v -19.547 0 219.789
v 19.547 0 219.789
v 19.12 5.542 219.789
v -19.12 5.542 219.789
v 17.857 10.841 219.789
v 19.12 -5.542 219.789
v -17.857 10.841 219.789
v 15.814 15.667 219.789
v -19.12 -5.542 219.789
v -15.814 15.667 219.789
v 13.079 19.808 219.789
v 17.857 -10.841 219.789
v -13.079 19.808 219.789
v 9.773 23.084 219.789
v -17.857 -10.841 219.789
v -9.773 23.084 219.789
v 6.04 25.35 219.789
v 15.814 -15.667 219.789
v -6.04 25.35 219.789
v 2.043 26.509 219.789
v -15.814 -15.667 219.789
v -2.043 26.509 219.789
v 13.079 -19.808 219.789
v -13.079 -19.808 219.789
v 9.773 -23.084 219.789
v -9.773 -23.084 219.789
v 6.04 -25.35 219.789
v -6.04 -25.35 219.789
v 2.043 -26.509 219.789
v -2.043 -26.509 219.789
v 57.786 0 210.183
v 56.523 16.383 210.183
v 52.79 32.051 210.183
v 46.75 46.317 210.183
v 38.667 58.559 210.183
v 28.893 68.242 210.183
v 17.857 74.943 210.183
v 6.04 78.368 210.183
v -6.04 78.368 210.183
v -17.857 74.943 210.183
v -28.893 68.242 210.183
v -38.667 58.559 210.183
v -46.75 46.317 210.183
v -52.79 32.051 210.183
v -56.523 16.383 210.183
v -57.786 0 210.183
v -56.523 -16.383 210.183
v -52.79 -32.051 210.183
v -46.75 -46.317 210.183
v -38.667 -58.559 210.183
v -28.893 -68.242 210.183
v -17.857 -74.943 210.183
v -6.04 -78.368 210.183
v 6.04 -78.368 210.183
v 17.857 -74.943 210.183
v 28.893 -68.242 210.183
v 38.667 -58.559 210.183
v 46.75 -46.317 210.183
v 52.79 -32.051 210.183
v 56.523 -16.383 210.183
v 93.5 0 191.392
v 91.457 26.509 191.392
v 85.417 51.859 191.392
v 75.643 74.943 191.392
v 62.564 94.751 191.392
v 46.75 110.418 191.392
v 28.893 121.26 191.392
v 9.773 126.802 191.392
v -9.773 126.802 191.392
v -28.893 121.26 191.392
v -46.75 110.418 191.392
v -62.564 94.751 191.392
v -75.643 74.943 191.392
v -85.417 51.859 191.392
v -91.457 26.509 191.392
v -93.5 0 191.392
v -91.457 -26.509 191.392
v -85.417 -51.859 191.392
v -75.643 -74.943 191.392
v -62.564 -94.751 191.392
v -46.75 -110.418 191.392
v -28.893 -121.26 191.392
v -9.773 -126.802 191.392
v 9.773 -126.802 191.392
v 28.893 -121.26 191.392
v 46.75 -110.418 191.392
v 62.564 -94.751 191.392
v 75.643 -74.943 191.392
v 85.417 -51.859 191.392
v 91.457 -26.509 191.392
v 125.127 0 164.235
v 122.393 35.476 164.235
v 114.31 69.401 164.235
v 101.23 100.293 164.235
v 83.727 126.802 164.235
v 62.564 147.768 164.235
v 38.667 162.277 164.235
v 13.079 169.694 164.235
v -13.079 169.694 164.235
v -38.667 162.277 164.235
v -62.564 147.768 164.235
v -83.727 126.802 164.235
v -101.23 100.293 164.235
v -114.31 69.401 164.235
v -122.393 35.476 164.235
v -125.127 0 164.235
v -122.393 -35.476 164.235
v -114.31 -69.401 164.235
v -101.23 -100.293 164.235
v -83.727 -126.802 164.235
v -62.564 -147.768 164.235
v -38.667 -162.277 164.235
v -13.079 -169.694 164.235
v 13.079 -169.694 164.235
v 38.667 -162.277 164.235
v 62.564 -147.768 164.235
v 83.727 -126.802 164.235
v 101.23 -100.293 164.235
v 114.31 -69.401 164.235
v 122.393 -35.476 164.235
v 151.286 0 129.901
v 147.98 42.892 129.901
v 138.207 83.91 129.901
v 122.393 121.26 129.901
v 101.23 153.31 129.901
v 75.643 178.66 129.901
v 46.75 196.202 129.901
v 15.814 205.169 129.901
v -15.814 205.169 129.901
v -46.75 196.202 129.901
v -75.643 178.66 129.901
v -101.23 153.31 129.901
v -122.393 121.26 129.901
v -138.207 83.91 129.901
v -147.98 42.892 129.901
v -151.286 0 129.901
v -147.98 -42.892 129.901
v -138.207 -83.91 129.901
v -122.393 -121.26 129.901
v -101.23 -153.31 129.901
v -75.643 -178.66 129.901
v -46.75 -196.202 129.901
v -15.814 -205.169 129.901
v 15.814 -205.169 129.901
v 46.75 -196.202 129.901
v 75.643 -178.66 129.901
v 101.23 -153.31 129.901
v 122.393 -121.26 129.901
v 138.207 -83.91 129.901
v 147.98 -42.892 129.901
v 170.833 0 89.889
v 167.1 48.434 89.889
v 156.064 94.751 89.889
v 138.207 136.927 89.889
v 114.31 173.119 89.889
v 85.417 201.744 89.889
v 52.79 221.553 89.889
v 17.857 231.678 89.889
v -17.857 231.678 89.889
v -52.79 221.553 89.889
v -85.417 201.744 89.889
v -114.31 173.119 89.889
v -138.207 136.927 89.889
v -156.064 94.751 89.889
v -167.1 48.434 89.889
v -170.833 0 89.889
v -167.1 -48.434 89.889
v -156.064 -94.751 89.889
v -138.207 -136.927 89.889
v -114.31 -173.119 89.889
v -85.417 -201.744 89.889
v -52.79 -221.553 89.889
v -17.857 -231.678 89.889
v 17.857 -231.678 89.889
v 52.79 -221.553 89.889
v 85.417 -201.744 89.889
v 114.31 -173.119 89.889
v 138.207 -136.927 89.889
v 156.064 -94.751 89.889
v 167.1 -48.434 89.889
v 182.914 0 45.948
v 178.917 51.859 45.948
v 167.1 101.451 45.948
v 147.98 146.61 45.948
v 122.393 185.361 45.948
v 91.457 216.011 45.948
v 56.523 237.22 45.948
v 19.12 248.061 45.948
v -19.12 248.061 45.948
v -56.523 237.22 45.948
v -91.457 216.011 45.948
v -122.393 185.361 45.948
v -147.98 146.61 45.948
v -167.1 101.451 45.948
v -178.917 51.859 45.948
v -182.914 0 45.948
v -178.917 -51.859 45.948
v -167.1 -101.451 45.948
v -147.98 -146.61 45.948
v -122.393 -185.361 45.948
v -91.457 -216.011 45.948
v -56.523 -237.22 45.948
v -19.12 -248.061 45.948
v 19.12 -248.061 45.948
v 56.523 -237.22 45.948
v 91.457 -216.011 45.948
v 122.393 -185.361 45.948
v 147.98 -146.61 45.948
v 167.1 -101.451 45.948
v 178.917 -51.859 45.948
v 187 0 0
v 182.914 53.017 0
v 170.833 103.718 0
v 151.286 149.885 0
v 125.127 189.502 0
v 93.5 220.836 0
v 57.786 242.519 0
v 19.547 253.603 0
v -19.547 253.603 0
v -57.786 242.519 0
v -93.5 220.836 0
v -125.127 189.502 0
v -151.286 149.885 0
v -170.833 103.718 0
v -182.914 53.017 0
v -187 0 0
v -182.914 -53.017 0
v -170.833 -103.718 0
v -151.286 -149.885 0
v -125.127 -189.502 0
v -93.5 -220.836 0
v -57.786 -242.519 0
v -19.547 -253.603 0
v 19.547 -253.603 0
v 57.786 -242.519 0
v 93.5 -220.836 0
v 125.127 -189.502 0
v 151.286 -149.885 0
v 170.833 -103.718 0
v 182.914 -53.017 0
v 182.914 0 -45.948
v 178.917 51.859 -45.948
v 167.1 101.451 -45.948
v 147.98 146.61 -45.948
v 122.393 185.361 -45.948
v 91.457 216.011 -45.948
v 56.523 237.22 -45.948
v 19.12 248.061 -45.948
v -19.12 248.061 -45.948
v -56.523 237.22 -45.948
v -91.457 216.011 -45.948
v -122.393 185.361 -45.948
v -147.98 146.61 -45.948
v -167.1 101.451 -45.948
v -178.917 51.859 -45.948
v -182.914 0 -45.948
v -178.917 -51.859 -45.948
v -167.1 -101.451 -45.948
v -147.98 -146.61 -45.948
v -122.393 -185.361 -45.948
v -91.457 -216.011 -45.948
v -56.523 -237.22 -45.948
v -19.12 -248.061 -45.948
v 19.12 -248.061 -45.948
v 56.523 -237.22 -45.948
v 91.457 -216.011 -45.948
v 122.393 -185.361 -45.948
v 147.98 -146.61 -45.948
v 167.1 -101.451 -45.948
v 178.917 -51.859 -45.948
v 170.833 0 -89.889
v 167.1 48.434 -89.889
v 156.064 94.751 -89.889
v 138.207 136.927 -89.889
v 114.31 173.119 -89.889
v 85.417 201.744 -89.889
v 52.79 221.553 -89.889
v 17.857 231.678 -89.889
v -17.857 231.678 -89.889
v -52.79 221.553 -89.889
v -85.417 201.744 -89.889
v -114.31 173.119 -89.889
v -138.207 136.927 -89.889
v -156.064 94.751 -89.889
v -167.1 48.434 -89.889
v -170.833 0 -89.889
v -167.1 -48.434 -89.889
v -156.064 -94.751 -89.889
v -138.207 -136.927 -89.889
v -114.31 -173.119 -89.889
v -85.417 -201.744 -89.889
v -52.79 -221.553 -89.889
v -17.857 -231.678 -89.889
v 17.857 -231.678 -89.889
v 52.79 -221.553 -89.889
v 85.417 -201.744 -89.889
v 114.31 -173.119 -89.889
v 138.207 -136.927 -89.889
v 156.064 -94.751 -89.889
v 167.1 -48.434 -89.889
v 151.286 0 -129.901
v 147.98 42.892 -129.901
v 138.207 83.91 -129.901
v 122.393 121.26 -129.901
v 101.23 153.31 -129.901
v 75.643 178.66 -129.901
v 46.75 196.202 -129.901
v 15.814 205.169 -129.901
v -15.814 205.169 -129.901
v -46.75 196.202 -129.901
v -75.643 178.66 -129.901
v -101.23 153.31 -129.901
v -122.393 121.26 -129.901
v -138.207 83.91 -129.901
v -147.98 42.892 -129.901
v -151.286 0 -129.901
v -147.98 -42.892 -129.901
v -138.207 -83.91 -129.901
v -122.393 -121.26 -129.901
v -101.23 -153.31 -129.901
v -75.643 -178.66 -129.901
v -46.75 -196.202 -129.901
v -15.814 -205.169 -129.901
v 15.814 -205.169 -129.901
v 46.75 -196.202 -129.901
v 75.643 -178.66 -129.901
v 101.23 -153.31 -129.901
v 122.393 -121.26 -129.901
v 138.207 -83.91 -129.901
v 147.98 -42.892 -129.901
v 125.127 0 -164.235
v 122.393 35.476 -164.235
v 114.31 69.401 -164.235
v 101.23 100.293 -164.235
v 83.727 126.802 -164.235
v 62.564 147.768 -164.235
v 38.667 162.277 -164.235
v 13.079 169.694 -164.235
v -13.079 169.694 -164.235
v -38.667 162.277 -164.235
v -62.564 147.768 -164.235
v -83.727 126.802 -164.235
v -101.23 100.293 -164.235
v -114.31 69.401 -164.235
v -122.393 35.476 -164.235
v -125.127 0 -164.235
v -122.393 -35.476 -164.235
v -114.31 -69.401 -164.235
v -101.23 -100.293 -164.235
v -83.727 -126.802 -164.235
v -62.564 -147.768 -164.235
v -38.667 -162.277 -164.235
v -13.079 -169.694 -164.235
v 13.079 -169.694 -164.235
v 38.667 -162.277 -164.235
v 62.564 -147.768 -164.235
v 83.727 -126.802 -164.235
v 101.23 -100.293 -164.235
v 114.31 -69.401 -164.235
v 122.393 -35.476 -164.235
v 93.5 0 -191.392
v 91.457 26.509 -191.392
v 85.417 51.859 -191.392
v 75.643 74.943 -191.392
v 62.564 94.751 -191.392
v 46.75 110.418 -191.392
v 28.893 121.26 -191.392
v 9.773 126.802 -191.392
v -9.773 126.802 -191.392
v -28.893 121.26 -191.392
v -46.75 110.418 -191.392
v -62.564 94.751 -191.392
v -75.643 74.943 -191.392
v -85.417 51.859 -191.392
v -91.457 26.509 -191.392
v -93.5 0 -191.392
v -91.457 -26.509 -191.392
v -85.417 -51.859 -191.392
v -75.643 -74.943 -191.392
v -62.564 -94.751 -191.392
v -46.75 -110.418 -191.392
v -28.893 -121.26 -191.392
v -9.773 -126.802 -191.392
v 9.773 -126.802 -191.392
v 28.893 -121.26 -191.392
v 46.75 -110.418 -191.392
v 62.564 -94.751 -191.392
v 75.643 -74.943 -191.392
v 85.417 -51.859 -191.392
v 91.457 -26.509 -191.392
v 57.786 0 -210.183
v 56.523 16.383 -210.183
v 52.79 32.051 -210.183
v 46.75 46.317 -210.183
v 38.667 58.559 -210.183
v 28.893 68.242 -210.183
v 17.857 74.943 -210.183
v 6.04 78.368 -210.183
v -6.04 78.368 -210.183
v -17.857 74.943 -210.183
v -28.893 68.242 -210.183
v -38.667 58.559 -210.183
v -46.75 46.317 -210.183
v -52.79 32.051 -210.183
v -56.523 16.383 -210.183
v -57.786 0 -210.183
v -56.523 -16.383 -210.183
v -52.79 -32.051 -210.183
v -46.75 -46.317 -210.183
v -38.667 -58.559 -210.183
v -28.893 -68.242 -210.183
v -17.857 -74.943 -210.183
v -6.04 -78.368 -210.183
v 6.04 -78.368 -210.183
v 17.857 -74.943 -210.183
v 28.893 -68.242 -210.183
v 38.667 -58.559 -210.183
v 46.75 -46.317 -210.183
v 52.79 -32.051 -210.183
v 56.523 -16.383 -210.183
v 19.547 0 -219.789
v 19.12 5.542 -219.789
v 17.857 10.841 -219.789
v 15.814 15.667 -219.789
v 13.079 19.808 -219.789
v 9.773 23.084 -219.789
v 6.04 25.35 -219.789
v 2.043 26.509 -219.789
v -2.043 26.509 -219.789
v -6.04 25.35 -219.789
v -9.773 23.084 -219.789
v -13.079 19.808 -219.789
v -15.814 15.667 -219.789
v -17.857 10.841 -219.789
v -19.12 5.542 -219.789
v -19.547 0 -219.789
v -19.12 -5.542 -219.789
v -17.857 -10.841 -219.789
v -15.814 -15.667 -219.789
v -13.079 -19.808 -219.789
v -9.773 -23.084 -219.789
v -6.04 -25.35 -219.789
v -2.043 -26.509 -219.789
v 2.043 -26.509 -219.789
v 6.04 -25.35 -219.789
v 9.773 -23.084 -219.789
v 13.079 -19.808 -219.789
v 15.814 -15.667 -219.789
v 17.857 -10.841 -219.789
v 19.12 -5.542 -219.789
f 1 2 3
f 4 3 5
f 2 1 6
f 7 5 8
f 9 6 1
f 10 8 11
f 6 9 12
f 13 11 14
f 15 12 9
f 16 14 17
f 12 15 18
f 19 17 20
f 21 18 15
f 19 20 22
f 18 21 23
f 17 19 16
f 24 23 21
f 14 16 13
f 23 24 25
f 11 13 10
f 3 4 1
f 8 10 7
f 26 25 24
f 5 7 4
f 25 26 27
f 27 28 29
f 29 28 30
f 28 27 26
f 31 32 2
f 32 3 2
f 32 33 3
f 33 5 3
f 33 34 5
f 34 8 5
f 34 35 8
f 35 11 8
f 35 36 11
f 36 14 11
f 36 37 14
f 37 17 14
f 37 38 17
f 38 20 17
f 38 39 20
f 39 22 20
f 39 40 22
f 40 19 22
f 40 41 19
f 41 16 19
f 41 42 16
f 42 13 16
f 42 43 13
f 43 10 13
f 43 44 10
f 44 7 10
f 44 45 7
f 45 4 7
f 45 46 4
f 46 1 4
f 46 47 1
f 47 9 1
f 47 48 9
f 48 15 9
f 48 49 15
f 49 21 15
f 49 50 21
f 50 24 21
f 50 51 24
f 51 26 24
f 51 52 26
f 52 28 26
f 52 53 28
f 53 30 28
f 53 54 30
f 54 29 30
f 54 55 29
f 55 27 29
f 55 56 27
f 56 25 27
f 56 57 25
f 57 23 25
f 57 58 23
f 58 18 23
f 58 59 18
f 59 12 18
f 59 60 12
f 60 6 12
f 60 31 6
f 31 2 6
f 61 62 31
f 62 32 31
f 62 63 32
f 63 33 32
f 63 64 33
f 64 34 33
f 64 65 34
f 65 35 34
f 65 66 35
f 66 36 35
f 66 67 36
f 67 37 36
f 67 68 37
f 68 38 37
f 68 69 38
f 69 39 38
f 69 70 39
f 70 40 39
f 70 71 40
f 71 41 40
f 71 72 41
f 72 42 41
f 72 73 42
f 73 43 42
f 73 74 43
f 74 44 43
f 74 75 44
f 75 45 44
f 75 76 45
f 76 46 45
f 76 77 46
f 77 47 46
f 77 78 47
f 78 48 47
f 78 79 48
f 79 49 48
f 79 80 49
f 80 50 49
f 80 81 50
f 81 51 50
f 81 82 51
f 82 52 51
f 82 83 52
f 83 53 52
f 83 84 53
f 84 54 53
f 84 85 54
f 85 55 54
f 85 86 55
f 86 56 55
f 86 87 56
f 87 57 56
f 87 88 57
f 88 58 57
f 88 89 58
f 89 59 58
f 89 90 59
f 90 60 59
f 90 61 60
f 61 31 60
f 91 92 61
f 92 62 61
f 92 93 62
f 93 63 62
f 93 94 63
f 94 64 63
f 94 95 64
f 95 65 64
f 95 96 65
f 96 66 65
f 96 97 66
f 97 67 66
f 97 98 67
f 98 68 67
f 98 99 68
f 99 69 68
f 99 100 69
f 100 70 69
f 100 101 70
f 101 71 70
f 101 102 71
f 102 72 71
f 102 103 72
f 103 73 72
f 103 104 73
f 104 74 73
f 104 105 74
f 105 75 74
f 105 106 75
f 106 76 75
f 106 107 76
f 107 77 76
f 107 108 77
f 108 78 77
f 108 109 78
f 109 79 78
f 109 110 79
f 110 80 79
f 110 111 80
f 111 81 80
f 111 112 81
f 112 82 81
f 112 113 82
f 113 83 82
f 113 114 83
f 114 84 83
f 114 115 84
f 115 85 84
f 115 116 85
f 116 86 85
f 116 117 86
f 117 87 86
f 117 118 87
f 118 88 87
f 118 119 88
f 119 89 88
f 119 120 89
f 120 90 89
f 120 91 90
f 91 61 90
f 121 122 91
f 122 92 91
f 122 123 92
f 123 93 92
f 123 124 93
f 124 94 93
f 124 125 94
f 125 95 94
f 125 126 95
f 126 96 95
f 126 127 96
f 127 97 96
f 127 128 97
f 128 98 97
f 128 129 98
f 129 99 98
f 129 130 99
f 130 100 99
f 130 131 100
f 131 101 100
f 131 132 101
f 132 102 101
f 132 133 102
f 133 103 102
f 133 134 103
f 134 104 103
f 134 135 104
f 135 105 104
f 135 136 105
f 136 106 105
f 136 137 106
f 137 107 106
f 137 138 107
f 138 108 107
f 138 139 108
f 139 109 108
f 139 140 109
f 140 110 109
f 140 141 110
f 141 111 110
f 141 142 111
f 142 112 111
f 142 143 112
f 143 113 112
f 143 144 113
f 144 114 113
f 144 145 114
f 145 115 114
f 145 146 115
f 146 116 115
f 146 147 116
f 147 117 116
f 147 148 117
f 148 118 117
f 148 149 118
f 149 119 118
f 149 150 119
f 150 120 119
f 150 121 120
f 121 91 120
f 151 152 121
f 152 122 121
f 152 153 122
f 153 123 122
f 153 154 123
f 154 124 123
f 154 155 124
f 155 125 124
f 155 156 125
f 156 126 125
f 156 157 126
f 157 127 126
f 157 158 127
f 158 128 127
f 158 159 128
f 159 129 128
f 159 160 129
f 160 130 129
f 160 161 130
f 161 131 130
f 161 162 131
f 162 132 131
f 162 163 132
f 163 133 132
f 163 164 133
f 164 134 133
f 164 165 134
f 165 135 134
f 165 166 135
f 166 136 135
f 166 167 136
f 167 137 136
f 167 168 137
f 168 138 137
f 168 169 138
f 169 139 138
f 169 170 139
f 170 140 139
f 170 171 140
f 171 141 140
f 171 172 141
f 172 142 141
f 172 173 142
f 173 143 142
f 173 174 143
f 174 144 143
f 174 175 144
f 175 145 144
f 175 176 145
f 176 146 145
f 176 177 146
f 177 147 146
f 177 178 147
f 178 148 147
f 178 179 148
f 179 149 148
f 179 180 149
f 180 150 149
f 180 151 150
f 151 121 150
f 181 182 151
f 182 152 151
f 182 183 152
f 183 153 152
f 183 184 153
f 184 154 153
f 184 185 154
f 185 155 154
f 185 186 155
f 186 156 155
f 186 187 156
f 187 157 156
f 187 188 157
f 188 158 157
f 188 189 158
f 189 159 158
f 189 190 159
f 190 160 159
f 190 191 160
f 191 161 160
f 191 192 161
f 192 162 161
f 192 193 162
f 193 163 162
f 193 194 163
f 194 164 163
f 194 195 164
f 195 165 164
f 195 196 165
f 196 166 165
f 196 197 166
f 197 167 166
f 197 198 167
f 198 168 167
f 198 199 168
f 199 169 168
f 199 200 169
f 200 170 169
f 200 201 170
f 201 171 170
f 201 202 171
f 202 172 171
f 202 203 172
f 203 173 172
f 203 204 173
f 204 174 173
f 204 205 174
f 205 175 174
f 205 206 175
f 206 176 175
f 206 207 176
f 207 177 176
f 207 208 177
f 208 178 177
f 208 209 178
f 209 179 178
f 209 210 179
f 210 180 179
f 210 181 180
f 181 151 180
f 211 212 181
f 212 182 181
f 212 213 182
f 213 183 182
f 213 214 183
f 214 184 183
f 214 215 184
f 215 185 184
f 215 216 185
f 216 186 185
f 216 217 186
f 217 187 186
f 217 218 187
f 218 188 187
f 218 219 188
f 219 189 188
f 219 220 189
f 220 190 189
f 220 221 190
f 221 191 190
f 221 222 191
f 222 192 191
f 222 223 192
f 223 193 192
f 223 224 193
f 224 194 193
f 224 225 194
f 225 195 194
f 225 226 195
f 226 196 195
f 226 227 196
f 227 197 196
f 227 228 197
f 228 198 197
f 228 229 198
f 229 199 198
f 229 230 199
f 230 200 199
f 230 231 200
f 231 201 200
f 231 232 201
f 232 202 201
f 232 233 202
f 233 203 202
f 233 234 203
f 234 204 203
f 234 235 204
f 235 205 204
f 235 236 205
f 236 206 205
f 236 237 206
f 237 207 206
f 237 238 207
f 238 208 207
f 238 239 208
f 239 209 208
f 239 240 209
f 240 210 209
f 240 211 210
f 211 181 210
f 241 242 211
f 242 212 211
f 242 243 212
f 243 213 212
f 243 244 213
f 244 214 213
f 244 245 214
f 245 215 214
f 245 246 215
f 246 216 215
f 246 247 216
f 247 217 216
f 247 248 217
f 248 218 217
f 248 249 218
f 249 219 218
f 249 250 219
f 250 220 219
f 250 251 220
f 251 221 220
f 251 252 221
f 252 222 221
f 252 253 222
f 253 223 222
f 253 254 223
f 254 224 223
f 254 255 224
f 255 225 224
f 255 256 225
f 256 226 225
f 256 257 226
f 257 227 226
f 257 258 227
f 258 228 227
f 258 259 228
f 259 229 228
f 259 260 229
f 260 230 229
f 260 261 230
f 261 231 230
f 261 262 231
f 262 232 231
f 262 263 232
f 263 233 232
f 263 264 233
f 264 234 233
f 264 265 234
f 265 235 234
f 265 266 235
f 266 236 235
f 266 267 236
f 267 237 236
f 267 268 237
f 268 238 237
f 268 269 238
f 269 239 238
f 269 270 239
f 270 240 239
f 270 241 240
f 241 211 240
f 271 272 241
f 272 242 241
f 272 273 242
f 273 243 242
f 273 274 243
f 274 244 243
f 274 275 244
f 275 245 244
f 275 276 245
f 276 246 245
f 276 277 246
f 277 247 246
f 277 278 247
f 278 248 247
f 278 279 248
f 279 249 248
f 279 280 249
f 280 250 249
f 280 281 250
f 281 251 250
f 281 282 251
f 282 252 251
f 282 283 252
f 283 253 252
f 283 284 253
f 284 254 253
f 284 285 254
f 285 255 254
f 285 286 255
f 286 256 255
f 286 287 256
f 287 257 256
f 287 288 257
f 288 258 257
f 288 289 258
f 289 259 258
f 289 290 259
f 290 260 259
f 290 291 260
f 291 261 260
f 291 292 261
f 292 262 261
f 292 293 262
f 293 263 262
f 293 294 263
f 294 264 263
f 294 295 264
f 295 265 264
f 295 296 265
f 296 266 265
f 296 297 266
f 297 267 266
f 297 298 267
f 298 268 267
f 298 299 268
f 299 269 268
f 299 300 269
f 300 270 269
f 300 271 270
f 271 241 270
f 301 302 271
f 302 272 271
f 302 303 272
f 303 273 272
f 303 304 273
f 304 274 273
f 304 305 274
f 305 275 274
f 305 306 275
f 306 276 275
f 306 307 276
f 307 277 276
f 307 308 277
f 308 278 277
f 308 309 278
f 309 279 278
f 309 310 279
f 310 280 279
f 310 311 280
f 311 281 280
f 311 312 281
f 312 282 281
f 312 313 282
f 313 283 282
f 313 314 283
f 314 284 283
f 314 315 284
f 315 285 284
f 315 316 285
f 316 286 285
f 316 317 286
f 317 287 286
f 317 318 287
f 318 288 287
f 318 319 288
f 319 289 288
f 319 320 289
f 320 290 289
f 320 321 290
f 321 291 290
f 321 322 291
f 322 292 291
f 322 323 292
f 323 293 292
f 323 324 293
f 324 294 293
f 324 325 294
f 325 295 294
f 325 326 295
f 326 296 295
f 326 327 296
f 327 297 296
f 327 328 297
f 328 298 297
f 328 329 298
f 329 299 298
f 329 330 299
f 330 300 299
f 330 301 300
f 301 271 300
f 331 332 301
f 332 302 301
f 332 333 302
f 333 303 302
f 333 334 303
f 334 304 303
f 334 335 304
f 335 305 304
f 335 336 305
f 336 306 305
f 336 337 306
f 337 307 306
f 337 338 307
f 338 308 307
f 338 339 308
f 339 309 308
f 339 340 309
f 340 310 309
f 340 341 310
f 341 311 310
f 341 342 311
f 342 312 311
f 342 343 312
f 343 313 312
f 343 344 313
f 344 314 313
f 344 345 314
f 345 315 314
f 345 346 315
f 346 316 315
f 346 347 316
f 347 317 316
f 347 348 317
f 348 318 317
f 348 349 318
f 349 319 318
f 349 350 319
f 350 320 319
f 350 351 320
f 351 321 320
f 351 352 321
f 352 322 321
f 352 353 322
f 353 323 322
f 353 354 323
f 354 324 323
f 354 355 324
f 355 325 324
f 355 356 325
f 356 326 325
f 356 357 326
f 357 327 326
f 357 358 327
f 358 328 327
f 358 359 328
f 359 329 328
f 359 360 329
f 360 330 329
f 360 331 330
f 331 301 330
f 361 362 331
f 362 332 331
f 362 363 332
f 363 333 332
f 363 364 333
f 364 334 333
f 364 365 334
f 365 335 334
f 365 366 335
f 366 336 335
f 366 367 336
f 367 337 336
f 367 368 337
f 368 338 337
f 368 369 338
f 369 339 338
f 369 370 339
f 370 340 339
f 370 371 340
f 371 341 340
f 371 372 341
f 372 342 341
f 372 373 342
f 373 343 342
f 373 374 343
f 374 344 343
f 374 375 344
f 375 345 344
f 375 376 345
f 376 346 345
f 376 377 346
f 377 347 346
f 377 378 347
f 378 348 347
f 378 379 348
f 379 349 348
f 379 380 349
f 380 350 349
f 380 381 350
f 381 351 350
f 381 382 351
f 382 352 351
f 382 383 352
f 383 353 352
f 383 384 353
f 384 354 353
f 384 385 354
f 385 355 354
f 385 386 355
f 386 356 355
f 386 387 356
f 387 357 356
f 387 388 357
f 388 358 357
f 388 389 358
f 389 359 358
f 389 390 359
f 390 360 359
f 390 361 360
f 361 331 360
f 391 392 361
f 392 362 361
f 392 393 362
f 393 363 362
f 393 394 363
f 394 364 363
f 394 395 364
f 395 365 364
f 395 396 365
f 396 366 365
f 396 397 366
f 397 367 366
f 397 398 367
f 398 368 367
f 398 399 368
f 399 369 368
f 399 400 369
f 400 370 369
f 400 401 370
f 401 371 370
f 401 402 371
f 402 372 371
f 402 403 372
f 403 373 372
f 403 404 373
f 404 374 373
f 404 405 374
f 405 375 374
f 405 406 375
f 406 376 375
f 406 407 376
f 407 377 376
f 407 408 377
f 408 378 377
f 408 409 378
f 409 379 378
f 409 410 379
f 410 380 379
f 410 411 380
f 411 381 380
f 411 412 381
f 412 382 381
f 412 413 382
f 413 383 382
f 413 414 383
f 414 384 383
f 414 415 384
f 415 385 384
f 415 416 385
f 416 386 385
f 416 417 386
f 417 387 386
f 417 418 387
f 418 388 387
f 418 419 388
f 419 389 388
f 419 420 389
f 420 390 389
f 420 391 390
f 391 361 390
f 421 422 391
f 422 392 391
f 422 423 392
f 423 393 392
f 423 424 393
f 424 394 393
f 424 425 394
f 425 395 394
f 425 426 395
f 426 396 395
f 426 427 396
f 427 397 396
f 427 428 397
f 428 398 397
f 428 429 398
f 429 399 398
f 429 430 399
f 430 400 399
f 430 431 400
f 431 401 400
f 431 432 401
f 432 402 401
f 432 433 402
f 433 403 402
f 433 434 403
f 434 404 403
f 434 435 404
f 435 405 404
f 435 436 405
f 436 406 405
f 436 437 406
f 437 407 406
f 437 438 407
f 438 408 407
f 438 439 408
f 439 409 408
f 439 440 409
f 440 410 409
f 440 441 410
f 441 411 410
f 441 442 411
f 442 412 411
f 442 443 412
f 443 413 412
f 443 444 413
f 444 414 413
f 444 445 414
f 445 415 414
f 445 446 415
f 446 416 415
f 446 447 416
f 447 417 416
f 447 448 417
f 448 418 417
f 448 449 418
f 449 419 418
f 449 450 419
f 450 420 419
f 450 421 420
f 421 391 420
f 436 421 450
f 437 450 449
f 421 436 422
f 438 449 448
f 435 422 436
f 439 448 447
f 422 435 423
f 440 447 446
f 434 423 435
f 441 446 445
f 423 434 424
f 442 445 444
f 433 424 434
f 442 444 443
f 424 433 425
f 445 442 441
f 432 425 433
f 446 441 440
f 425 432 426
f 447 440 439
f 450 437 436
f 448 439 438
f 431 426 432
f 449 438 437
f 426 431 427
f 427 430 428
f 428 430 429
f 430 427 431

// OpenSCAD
// Generated by SolidPython 1.0.1 on 2020-07-29 00:46:50


scale(v = [11, 15, 13]) {
	sphere(r = 17);
}
/***********************************************
*********      SolidPython code:      **********
************************************************
 
# import packages: SolidPython
from solid import *
from solid.utils import *
from itertools import chain, combinations, permutations


class Resize:

    def __init__(self, scad_file):
        self.scad_file = scad_file
        #self.scad_file = import_scad(scad_file)
        # cone/cylinder param:
        self.r1 = 0
        self.r2 = 0
        self.h = 0
        # rectangular prism param:
        self.w = 0
        self.l = 0
        # ellipse param:
        self.r = 0

    # import OpenScad code (file name corresponds to shape)


    # classify shape + parameters
    def assign(self, param1, param2, param3):
        if self.scad_file == 'cone.scad':
            self.r1 = param1
            self.r2 = param2
            self.h = param3
        elif self.scad_file == 'cylinder.scad':
            self.r1 = param1
            self.r2 = param2
            self.h = param3
        elif self.scad_file == 'rectangularPrism.scad':
            self.h = param1
            self.l = param2
            self.w = param3
        else:
            self.r = param1
            self.h = param2

    # resize parameters
    def iterate(self):
        x = range(3, 20, 2)
        i = 1
        if self.scad_file == 'cone.scad':
            tempList = list(permutations(x, 2))
            for temp in tempList:
                param1 = temp[0]
                param2 = temp[1]
                filepath = 'produced_scad_files/' + 'cone' + str(param1) + '_' + str(param2) + '_' + '.scad'
                scad_render_to_file(cylinder(h=param1, r1=param2, r2=0), filepath)

        elif self.scad_file == 'cylinder.scad':
            tempList = list(permutations(x, 3))
            for temp in tempList:
                param1 = temp[0]
                param2 = temp[1]
                filepath = 'produced_scad_files/' + 'cylinder' + str(param1) + '_' + str(param2) + '_' + '.scad'
                scad_render_to_file(cylinder(h=param1, r1=param2, r2=param2), filepath)

        elif self.scad_file == 'rectangularPrism.scad':
            tempList = list(permutations(x, 3))
            for temp in tempList:
                param1 = temp[0]
                param2 = temp[1]
                param3 = temp[2]
                filepath = 'produced_scad_files/' + 'rectangularPrism' + str(param1) + '_' + str(param2) + '_' + str(
                    param3) + '.scad'
                scad_render_to_file(cube(size=(param1, param2, param3)), filepath)

        elif self.scad_file == 'ellipse.scad':
            tempList = list(permutations(x, 4))
            for temp in tempList:
                param1 = temp[0]
                param2 = temp[1]
                param3 = temp[2]
                param4 = temp[3]
                filepath = 'produced_scad_files/' + 'ellipse' + str(param1) + '_' + str(param2) + '_' + str(param3) + '_' + str(param4) + '.scad'
                scad_render_to_file(scale([param1, param2, param3])(sphere(r=param4)), filepath)

    def render_to_scadfile(self):
        scad_render_to_file(scad, 'example.scad') 
 
************************************************/
